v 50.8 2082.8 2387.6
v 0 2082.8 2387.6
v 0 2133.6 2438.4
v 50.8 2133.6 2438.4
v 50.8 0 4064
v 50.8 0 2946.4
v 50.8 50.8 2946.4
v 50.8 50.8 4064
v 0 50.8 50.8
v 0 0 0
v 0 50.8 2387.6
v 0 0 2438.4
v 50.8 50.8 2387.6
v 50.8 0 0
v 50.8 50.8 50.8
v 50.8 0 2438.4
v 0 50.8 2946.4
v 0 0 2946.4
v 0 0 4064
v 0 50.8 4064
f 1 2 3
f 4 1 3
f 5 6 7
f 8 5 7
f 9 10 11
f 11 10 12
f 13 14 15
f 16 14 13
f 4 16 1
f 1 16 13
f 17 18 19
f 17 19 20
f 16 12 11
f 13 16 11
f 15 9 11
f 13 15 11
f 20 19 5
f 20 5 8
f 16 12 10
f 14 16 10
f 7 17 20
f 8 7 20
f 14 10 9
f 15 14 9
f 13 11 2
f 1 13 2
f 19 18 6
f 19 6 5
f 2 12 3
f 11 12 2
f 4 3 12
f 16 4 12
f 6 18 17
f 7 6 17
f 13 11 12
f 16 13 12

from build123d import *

# Parameters (mm, degrees)
F2_DEPTH = 50.8
F4_DEPTH = 50.8
F5_W     = 50.8
F5_H     = 1117.6
F6_DEPTH = 50.8


with BuildPart() as f2:
    # F1 (on Right) → F2 (new body)
    with BuildSketch(Plane.YZ):
        Polygon((50.8, 2387.6), (0, 2438.4), (0, 0), (50.8, 50.8), align=None)
    extrude(amount=F2_DEPTH)


with BuildPart() as f4:
    # F3 (on Right) → F4 (new body)
    with BuildSketch(Plane.YZ):
        Polygon((2133.6, 2438.4), (0, 2438.4), (50.8, 2387.6), (2082.8, 2387.6), align=None)
    extrude(amount=F4_DEPTH)


with BuildPart() as f6:
    # F5 (on Right) → F6 (new body)
    with BuildSketch(Plane.YZ):
        with Locations((25.4, 3505.2)):
            Rectangle(F5_W, F5_H)
    extrude(amount=F6_DEPTH)


solid = Compound([f2.part, f4.part, f6.part])
